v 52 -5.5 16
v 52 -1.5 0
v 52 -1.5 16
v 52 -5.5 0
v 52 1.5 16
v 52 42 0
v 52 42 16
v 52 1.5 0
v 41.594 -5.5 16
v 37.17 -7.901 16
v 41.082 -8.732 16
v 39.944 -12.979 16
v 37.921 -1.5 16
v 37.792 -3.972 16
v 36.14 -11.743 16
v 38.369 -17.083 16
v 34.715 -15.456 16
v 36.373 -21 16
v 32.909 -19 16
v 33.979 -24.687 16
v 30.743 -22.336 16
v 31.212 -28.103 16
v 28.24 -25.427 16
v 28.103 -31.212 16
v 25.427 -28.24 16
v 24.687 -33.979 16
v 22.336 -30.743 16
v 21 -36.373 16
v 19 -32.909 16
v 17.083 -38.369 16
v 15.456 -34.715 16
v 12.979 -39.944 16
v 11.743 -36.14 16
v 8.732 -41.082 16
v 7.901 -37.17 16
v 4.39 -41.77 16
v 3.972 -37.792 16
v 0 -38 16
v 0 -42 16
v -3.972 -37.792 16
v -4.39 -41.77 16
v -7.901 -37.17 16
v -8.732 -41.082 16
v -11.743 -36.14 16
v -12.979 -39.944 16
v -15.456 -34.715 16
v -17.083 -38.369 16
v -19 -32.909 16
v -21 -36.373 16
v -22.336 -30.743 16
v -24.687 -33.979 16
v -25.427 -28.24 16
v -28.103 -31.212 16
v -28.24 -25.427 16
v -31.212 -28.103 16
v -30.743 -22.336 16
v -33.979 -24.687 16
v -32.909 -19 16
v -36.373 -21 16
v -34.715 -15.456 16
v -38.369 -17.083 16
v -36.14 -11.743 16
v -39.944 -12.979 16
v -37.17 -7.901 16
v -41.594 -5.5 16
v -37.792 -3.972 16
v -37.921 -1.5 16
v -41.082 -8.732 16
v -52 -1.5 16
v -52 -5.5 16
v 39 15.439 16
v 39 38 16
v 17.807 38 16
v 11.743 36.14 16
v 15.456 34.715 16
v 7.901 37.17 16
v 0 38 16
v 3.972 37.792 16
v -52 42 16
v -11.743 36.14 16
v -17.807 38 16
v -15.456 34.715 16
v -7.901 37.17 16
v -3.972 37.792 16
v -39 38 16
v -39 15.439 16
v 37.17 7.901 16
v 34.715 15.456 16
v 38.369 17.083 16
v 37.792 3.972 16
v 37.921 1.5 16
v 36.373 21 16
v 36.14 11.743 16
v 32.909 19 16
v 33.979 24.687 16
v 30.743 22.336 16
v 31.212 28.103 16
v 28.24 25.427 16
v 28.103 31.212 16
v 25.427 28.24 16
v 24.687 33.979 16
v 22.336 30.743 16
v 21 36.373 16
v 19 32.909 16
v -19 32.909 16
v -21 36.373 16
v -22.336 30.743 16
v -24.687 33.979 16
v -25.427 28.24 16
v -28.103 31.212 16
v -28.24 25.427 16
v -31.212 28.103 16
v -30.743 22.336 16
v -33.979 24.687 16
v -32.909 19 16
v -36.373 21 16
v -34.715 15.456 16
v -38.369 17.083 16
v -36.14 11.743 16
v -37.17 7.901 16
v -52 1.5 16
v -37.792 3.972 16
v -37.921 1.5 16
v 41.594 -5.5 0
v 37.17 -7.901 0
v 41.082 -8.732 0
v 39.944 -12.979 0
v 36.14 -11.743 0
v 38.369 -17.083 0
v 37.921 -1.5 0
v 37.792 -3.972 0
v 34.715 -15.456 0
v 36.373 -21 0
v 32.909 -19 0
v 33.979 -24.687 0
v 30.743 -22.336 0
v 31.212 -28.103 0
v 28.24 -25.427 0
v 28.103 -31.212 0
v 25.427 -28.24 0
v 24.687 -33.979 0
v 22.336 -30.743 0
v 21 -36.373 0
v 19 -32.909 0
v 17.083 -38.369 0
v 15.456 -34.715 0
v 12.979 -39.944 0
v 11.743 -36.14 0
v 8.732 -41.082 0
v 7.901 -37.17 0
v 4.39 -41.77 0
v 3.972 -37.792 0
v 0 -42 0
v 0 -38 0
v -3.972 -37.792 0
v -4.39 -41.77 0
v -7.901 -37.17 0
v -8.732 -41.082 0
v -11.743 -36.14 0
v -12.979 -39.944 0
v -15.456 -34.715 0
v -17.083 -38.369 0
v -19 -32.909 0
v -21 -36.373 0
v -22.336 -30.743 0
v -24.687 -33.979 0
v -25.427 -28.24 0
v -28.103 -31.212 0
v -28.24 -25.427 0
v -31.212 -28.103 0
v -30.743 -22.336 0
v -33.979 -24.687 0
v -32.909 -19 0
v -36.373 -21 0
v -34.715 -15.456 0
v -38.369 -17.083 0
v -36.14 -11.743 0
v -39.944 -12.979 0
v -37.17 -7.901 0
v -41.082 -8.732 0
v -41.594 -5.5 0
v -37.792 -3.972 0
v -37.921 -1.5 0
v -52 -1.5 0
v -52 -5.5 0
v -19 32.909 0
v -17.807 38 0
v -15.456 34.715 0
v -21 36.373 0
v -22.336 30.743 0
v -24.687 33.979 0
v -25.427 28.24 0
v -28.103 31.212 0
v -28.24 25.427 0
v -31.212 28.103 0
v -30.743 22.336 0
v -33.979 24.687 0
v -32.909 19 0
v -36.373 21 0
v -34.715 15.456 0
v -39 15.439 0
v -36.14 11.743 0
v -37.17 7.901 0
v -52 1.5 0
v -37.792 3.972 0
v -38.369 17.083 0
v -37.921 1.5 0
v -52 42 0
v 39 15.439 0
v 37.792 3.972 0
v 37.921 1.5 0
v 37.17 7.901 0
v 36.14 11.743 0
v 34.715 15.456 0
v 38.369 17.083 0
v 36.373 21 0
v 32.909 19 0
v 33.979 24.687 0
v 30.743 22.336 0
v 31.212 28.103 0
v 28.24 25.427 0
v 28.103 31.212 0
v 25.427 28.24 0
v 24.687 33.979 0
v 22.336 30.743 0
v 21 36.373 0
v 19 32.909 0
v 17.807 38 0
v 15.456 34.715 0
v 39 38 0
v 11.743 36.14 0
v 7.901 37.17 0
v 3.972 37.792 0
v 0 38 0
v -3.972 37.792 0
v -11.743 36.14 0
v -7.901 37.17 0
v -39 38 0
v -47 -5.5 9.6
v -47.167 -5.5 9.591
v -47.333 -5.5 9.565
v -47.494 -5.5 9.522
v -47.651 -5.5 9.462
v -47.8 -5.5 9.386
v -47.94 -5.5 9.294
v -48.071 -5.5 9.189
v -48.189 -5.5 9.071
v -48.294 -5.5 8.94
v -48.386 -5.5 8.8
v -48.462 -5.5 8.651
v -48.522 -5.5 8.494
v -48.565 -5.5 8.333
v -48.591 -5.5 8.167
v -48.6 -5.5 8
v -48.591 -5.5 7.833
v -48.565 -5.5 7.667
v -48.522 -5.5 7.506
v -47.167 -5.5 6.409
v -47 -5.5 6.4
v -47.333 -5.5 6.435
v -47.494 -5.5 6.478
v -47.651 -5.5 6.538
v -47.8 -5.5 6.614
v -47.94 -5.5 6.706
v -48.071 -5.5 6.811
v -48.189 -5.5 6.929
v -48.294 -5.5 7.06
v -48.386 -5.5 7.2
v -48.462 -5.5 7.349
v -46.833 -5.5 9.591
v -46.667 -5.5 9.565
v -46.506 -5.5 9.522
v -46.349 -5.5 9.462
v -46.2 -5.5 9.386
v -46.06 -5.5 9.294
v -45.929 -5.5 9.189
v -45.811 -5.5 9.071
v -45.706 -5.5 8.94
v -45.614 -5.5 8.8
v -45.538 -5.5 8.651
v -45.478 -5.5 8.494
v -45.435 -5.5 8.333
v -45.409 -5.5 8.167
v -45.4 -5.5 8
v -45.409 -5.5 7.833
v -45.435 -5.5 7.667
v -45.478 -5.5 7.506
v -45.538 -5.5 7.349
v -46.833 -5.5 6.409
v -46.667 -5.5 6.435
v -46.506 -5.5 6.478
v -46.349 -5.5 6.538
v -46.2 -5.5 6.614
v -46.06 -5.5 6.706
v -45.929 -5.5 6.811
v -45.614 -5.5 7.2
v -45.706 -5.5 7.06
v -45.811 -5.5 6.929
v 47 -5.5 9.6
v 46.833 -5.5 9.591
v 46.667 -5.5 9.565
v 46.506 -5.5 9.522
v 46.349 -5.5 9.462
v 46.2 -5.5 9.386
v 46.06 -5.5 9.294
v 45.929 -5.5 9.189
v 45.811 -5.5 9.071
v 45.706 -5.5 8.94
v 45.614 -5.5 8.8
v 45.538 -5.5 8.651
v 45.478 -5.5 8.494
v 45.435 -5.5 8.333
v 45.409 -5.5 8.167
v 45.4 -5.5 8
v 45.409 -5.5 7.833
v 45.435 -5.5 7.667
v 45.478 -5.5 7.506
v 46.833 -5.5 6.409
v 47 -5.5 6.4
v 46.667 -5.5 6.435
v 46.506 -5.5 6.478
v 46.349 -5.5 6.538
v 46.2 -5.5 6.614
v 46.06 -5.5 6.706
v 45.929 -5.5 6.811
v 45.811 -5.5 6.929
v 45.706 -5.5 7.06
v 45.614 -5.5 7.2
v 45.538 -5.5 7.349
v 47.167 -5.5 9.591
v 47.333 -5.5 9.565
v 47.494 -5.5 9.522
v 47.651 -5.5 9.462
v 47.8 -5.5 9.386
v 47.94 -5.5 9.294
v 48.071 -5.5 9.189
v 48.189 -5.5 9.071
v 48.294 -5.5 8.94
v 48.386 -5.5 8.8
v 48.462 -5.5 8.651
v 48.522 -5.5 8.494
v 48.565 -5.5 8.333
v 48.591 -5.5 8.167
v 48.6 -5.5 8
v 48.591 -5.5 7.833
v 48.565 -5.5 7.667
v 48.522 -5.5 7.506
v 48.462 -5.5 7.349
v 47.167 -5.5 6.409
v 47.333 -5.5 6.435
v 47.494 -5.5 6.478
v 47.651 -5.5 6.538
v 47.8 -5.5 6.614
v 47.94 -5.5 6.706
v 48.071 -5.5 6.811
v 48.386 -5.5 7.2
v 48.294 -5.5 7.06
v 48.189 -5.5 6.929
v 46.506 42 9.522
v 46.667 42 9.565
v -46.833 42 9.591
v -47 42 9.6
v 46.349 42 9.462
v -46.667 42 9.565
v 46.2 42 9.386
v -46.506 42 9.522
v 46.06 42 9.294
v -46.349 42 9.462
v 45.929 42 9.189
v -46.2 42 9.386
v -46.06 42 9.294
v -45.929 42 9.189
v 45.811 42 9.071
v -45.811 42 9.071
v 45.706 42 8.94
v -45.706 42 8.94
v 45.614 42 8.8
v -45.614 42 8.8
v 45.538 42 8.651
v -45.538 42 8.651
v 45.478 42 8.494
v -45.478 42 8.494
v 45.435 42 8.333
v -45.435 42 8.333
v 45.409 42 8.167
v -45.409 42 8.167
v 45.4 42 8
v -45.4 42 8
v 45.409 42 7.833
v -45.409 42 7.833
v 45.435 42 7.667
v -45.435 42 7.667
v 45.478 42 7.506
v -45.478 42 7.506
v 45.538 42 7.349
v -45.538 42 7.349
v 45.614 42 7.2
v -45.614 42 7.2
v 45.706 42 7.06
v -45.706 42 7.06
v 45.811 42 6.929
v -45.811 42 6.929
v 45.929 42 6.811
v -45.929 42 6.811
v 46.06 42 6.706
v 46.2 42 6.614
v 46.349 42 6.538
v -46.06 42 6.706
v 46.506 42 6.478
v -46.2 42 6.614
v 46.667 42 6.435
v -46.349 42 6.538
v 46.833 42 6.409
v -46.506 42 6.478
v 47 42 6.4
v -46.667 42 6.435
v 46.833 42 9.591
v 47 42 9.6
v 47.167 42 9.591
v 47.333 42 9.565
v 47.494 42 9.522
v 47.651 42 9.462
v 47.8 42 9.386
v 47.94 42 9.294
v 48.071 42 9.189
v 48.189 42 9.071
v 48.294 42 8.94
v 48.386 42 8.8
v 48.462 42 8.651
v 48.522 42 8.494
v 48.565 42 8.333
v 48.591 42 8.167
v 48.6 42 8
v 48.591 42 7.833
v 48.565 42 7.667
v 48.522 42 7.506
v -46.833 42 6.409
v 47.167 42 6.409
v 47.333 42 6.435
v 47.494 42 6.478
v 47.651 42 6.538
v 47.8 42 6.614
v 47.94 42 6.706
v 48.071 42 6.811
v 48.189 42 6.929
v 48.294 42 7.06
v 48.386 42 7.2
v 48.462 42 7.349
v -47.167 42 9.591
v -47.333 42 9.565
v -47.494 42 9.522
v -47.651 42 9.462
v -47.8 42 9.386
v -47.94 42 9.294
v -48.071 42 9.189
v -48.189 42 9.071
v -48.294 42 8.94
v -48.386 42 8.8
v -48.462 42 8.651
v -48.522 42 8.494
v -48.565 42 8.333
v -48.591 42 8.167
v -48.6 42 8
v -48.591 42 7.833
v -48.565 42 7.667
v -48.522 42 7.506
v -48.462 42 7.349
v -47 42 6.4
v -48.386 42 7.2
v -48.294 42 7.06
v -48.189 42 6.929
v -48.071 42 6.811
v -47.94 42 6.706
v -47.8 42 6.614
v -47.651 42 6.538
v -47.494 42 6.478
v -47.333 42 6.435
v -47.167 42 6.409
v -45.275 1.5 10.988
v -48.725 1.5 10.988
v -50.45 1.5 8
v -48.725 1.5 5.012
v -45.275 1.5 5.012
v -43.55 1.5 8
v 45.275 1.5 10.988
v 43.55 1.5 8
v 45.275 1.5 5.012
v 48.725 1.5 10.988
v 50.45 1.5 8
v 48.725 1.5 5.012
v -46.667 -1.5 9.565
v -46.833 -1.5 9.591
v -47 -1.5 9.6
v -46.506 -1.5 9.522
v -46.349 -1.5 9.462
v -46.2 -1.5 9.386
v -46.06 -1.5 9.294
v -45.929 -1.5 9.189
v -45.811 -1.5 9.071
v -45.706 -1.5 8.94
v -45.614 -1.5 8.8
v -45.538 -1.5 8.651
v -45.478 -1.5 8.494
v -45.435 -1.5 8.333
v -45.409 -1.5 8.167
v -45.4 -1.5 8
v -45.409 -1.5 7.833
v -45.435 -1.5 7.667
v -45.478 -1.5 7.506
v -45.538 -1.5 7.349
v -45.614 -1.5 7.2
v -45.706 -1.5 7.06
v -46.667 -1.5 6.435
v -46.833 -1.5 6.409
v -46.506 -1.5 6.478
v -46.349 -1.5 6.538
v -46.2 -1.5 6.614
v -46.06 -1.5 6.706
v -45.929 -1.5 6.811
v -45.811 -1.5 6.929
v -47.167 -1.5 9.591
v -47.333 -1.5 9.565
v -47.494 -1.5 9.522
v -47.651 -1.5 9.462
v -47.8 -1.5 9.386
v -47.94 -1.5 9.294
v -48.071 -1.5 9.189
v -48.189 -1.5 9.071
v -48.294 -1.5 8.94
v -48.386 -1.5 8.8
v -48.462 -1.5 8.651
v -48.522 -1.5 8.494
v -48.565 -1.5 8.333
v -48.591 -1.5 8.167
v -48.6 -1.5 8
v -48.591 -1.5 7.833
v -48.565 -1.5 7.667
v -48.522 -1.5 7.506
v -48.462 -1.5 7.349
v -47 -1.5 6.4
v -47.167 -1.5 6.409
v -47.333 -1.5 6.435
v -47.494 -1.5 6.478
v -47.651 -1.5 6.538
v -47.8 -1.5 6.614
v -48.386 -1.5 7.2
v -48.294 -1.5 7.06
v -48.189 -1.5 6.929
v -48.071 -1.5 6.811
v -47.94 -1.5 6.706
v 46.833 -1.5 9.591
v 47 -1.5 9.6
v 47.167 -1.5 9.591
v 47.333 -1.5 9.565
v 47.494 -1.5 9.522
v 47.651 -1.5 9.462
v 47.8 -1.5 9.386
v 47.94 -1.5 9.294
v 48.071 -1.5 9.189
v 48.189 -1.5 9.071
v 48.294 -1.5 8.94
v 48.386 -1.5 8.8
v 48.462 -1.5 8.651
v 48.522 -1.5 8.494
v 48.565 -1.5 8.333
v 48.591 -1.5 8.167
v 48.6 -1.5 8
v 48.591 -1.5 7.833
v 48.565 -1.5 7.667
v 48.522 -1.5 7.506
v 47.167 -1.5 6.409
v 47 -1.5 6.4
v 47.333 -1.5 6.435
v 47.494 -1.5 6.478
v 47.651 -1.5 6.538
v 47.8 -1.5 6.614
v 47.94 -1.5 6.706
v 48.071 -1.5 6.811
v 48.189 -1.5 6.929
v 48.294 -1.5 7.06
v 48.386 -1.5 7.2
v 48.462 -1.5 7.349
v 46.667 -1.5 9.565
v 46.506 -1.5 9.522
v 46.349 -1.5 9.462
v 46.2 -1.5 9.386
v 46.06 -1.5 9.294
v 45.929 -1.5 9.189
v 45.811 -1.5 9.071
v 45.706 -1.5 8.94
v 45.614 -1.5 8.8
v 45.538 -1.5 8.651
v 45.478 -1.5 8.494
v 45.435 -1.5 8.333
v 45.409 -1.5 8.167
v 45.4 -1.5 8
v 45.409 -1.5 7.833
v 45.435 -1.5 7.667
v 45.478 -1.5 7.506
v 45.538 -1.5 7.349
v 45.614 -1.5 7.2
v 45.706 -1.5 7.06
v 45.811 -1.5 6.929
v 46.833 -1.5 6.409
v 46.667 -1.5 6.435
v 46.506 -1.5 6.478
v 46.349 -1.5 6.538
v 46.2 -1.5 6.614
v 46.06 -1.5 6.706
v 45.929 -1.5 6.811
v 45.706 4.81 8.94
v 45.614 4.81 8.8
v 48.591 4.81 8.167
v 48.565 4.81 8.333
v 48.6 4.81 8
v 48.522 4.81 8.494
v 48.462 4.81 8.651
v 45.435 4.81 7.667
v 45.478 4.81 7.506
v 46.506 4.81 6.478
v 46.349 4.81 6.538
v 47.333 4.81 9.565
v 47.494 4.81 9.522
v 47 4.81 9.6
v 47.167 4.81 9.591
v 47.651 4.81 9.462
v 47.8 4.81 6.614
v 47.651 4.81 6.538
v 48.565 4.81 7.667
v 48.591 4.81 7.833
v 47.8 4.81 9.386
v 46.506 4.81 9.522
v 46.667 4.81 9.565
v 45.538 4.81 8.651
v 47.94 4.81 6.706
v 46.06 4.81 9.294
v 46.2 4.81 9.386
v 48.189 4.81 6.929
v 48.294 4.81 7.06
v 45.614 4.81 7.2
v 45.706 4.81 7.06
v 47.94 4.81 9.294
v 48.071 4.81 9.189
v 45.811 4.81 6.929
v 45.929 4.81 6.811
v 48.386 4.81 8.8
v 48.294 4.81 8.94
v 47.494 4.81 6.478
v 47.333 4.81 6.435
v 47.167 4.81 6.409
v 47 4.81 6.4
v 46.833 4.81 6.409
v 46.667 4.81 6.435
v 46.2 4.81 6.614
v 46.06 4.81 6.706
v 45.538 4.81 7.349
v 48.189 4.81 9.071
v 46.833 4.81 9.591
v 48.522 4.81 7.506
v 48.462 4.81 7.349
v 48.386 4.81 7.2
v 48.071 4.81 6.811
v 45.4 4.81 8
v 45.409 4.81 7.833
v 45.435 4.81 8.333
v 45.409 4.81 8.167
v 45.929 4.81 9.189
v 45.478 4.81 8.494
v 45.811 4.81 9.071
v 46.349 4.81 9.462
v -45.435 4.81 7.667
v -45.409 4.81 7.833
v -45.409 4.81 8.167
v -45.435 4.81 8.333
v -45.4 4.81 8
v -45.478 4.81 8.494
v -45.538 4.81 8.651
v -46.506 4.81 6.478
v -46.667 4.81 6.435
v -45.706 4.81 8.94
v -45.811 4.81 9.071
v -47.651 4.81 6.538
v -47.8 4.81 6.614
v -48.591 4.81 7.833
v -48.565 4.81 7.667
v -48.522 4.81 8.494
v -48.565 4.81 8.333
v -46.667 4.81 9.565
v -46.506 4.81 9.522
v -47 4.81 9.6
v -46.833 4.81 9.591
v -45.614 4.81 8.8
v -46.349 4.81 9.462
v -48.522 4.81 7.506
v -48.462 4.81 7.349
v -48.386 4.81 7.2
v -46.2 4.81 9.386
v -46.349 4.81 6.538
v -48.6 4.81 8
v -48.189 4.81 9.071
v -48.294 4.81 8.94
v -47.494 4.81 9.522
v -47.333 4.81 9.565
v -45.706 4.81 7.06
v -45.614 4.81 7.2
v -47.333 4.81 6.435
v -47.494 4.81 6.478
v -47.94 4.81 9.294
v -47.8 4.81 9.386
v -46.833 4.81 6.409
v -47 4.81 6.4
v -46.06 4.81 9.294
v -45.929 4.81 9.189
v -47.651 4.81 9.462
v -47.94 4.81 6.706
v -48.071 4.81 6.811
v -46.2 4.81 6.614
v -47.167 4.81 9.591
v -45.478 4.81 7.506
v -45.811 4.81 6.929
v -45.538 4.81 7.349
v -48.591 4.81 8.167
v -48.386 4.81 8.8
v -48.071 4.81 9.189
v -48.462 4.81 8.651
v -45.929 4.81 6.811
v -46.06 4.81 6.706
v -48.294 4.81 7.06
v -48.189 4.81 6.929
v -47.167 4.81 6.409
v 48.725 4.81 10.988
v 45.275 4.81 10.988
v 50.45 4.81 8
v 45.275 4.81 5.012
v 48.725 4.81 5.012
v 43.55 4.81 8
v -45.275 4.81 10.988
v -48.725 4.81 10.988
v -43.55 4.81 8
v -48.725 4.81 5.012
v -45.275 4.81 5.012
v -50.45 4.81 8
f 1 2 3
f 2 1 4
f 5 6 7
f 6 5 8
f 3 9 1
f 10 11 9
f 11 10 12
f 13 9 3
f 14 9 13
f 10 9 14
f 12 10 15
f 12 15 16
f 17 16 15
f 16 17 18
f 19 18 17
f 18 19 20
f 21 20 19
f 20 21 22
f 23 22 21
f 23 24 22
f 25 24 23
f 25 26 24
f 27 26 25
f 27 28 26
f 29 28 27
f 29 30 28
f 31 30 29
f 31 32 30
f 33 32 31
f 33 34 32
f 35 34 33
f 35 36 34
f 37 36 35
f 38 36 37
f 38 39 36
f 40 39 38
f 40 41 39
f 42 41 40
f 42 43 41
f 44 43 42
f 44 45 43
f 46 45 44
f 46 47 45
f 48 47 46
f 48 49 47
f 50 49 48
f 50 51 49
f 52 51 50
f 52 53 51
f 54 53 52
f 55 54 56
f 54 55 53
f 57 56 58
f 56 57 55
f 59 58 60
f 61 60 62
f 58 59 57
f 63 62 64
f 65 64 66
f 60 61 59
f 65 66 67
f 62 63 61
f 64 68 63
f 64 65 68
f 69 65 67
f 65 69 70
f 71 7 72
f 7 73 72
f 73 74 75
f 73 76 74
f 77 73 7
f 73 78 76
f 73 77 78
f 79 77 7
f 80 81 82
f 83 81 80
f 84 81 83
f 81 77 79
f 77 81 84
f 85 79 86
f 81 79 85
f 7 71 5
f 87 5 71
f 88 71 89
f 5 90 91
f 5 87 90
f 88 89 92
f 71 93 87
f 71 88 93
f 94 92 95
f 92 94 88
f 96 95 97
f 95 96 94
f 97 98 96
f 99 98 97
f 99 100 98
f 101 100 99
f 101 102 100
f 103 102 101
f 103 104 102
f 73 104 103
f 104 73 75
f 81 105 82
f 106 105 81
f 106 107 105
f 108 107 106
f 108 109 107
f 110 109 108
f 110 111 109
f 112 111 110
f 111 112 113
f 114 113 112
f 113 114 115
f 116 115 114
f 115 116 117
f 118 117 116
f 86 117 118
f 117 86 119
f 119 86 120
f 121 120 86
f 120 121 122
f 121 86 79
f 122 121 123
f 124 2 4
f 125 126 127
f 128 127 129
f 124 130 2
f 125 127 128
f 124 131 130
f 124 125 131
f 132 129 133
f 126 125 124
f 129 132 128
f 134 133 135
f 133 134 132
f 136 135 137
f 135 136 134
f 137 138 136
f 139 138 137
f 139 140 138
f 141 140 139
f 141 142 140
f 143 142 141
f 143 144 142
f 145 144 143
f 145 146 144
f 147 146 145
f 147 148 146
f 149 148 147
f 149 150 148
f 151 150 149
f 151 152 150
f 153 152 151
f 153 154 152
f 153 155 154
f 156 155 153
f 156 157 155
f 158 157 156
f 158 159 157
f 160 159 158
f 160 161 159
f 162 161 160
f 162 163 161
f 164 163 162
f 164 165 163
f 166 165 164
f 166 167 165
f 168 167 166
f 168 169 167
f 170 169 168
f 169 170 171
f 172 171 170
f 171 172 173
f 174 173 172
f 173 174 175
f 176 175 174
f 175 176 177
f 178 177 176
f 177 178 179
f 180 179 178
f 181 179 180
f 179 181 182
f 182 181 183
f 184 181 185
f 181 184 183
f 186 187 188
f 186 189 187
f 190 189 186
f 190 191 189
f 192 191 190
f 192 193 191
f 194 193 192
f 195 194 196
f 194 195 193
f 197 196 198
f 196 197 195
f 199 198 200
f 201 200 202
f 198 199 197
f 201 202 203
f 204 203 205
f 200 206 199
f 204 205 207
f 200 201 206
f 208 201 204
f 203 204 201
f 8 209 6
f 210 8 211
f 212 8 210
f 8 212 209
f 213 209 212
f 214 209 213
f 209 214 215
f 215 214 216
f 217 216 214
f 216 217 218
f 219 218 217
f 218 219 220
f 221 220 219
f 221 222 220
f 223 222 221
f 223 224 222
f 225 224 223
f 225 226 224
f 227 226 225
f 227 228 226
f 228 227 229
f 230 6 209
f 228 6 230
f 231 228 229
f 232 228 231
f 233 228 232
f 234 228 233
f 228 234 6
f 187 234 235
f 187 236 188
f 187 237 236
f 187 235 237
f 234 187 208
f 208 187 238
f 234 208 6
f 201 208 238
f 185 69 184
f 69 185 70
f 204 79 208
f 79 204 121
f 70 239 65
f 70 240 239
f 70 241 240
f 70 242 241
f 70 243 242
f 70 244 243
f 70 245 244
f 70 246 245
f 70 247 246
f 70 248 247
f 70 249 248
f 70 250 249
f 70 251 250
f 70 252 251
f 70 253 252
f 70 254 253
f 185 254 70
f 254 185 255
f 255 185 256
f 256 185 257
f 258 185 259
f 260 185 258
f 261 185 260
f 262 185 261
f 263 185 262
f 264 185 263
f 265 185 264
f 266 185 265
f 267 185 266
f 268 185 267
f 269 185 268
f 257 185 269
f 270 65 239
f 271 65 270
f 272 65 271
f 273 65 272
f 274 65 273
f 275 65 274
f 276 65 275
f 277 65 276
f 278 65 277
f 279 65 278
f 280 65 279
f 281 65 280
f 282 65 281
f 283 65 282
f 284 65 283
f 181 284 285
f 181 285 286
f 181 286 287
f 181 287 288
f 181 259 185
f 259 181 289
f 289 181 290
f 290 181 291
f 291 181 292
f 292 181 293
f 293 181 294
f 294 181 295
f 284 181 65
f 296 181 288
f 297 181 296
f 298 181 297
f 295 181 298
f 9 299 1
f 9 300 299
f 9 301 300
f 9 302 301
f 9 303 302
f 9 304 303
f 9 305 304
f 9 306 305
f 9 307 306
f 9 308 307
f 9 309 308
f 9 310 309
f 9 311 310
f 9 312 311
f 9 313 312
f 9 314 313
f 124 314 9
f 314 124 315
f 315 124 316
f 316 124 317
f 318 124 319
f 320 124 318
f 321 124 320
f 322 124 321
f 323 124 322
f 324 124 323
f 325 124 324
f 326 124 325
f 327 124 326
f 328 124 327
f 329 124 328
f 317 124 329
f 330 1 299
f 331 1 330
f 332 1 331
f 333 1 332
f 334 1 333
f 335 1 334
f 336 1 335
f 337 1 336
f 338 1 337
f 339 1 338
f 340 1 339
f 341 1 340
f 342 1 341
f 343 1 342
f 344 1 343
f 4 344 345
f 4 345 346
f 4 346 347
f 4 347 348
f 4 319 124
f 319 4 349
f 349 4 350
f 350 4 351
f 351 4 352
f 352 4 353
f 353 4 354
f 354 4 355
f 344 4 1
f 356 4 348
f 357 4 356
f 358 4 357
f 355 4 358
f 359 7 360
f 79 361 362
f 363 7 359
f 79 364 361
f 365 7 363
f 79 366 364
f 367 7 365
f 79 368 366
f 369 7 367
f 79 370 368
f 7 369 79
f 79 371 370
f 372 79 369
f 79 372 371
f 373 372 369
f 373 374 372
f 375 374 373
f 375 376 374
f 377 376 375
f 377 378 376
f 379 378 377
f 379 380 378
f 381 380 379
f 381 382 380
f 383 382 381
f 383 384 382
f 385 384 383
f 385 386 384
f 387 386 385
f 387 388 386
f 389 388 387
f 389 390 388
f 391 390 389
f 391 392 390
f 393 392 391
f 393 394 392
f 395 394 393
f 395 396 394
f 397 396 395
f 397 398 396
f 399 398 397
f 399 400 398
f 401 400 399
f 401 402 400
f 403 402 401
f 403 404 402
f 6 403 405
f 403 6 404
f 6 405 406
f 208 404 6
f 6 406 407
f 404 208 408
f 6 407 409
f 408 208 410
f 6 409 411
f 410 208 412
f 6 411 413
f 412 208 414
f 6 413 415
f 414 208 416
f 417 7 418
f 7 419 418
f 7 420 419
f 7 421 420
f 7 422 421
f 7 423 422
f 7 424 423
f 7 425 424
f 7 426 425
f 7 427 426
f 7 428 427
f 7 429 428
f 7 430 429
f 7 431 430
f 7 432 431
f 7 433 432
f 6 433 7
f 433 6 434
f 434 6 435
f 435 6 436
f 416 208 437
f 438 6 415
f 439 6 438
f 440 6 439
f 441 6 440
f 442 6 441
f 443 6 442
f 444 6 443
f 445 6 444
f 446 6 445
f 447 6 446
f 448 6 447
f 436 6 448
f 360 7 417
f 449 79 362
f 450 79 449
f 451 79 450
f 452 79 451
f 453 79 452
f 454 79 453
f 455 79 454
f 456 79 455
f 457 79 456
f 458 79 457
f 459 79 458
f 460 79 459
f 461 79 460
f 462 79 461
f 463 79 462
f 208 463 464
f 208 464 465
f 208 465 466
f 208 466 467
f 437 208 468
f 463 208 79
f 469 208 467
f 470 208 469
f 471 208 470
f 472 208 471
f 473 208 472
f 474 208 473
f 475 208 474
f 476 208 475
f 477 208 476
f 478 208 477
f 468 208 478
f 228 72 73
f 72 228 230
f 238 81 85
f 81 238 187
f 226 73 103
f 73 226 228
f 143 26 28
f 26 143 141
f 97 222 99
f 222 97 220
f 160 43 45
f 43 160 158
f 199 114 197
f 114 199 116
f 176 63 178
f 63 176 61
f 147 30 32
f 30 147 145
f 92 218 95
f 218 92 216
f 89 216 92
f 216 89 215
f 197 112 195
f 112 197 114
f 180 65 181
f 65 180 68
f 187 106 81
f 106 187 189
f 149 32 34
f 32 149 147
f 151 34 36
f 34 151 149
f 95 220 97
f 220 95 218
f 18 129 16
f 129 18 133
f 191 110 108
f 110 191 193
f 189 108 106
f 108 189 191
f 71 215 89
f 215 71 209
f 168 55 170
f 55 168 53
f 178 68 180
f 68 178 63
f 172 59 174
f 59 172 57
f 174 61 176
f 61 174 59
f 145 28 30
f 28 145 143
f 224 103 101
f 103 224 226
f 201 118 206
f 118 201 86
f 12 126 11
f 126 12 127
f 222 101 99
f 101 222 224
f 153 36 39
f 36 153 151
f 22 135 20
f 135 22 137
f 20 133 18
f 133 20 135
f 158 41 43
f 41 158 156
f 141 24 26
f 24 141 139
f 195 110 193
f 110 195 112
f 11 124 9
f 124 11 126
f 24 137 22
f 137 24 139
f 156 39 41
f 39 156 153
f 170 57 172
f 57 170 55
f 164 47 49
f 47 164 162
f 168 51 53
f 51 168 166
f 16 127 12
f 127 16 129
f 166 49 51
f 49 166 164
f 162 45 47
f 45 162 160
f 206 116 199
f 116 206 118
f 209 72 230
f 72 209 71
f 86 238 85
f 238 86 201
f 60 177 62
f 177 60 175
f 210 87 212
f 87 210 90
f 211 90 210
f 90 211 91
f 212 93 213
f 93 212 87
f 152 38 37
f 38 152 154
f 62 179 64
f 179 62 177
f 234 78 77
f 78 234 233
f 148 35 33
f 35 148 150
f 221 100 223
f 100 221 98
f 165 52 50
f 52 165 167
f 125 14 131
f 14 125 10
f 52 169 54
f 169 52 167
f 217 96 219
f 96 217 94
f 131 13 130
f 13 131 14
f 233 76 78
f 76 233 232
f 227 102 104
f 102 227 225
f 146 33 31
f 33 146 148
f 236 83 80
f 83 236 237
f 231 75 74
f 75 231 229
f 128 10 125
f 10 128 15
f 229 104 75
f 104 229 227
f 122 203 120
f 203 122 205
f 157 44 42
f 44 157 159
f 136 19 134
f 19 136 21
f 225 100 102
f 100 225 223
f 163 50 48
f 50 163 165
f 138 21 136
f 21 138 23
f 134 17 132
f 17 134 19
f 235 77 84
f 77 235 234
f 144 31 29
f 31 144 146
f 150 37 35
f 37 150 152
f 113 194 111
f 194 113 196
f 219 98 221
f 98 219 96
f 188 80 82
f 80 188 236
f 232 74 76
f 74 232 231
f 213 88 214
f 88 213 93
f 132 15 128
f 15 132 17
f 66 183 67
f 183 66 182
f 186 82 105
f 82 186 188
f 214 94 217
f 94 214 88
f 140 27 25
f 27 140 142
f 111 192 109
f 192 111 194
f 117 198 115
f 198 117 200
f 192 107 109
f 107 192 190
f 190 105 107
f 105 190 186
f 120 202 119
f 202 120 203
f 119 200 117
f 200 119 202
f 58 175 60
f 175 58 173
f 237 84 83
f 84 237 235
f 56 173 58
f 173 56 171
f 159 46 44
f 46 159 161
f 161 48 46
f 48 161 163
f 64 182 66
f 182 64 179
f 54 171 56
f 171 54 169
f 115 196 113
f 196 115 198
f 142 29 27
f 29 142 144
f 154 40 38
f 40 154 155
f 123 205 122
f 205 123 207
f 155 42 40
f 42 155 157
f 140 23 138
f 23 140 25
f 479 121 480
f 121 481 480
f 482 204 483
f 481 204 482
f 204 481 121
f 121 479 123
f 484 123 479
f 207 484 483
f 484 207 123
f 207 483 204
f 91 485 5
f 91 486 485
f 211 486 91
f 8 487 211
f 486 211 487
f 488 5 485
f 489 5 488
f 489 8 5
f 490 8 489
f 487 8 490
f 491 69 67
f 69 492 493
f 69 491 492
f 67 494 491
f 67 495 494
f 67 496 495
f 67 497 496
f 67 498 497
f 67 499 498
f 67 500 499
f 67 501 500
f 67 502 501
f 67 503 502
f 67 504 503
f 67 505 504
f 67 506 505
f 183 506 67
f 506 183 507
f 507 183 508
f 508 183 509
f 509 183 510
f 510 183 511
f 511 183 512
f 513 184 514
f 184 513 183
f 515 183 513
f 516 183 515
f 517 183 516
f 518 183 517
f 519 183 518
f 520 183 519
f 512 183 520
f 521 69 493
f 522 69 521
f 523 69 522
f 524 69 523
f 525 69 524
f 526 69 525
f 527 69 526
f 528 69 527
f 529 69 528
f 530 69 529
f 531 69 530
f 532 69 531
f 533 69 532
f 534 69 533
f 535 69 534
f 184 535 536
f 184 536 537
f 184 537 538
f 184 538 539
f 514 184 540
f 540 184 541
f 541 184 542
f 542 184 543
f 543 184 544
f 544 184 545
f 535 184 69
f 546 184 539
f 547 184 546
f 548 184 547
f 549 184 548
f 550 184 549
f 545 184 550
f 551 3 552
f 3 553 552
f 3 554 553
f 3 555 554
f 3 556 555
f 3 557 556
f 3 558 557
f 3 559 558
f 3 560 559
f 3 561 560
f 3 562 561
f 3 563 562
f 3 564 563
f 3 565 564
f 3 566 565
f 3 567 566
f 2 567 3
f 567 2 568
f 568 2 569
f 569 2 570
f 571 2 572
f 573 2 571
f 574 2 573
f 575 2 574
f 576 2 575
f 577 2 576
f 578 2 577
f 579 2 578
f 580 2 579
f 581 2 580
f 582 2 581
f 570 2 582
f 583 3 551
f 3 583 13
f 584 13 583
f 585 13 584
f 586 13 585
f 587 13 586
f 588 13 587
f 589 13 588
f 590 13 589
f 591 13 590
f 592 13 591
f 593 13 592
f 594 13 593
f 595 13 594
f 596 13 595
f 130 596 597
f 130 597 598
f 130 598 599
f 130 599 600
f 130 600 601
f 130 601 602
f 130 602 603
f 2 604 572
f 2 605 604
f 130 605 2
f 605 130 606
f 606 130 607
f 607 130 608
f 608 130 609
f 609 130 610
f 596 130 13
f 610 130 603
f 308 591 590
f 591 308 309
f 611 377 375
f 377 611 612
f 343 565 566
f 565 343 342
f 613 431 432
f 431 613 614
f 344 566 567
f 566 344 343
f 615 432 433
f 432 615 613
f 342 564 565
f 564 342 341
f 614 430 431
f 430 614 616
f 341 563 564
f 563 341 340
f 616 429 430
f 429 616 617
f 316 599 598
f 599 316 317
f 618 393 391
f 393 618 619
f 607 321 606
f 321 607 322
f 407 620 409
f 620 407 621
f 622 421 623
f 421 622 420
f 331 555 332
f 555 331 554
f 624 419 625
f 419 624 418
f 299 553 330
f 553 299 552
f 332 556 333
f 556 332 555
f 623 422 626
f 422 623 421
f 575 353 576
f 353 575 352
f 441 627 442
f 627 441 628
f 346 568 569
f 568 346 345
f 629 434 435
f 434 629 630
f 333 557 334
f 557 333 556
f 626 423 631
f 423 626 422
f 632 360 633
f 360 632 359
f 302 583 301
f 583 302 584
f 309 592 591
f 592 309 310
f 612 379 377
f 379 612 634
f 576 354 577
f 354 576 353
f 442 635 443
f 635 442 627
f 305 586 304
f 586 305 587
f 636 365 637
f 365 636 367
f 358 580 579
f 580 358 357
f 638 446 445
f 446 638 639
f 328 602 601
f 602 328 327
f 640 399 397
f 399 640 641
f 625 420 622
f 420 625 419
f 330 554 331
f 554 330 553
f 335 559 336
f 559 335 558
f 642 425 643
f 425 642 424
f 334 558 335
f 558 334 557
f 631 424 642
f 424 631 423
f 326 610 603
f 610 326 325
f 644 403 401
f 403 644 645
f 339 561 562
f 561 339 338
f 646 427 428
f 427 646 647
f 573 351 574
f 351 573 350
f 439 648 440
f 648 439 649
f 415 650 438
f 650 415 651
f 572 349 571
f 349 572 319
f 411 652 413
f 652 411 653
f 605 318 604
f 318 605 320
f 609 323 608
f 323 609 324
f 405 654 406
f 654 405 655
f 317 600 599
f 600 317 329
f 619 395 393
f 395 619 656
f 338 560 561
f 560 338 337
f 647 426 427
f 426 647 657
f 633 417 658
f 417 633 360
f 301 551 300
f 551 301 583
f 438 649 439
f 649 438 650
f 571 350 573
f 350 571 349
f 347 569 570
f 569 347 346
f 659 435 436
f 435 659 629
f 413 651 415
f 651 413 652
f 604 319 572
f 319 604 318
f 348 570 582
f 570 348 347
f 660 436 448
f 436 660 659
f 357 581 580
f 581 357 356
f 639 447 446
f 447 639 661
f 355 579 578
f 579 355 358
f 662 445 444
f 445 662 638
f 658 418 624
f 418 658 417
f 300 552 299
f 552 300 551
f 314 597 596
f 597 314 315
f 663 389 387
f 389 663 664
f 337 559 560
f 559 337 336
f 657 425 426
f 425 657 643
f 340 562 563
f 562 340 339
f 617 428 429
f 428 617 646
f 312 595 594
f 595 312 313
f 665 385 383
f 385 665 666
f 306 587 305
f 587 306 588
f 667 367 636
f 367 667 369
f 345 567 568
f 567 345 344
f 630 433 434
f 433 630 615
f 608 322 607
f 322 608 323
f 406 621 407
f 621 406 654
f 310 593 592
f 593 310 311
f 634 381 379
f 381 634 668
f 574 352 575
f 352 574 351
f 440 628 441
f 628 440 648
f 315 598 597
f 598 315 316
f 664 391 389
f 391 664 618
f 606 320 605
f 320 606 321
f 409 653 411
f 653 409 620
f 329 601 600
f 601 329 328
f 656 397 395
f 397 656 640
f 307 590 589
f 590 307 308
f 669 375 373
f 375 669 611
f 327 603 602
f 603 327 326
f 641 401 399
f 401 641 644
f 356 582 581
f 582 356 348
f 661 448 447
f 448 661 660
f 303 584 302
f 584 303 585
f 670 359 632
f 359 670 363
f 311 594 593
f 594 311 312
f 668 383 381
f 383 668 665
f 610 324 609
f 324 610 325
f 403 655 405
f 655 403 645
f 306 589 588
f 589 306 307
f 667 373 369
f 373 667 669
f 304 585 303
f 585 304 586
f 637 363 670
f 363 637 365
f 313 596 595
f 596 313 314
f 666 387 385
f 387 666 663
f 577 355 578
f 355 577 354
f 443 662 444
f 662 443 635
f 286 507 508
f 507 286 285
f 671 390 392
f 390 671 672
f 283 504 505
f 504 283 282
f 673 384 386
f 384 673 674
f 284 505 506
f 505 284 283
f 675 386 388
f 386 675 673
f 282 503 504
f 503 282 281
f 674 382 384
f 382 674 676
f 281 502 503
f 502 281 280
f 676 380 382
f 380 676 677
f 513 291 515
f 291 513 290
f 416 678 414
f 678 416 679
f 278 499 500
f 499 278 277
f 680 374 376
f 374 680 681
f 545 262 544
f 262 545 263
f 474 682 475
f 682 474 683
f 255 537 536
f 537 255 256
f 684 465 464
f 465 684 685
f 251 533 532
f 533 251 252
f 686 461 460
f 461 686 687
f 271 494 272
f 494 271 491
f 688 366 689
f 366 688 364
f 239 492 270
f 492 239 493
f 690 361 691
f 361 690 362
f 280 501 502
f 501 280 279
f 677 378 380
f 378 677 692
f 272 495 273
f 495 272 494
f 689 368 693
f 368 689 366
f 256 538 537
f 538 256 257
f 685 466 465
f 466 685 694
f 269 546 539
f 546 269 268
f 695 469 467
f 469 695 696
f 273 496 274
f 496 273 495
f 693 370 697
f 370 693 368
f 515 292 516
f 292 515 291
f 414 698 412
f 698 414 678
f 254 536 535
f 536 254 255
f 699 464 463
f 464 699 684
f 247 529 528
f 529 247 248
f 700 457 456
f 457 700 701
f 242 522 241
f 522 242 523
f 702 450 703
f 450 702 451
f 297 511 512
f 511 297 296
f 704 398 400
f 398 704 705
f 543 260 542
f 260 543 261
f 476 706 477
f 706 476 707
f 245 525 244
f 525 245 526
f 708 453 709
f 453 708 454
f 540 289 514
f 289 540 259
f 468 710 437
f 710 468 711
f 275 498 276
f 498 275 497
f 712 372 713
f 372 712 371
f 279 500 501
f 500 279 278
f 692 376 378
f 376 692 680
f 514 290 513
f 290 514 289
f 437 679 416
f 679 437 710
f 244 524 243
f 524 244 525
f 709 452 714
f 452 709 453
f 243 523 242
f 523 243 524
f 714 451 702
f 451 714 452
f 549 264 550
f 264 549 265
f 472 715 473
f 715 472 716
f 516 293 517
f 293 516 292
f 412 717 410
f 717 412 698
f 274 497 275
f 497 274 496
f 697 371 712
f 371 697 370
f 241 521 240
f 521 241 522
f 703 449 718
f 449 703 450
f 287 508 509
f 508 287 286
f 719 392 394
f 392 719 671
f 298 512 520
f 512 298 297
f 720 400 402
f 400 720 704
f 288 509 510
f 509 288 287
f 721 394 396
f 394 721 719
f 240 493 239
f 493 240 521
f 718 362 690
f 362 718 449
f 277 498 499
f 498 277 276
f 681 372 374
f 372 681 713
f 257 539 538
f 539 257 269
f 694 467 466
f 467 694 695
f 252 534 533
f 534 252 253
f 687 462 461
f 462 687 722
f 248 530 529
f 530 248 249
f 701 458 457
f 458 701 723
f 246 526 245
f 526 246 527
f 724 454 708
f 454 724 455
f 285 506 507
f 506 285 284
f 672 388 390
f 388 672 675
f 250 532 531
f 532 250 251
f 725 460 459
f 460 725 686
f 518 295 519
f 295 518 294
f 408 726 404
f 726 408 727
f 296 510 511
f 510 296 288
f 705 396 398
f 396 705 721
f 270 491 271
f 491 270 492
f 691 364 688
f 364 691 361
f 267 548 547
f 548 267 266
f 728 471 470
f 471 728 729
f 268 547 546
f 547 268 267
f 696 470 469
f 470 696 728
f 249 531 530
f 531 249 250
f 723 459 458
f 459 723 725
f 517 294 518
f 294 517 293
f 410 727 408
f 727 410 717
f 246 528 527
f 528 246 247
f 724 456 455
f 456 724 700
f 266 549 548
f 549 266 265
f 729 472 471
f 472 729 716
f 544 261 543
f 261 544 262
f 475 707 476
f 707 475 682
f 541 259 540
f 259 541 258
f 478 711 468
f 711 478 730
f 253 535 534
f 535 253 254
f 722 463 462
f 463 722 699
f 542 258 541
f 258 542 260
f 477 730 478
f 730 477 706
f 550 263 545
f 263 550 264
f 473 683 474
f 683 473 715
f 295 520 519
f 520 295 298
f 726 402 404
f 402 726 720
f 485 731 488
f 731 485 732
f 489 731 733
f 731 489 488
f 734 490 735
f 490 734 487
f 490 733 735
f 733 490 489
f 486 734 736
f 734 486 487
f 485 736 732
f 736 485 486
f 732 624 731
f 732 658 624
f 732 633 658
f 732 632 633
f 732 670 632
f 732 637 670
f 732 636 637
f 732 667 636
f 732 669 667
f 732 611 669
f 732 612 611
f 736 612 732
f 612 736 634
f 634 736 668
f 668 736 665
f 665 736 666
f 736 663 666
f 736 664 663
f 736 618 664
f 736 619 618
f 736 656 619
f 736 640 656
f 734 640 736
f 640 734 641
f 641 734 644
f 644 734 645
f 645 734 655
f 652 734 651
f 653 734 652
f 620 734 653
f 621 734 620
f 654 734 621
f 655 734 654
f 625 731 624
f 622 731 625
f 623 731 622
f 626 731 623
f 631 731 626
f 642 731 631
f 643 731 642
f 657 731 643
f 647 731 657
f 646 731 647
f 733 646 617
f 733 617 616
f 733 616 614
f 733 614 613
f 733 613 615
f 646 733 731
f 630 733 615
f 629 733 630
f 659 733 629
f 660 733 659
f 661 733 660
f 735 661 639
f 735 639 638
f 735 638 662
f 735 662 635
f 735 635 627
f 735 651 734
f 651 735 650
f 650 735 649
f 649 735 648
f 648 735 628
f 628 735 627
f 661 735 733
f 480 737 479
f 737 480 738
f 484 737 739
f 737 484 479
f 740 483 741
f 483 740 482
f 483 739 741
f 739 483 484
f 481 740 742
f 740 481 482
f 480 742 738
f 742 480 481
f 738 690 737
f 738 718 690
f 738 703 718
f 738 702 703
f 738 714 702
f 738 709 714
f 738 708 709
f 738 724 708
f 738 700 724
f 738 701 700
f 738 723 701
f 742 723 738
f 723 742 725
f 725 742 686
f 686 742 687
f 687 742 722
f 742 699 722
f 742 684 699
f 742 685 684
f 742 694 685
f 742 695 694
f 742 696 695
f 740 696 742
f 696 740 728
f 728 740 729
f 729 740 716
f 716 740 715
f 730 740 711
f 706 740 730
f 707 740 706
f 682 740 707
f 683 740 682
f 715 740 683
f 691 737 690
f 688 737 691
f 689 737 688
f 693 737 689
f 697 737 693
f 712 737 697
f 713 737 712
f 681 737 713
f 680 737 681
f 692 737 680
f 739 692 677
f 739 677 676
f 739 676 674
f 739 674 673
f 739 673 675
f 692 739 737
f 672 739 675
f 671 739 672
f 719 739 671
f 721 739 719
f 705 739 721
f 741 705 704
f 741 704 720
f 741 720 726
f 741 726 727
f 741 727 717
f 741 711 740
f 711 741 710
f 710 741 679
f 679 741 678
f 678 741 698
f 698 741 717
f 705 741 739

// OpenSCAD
$fn=60;

polomer=38;
sirka_drzaku=16;
sila_drzaku=4;

prumer_sroubu=3.2;
vyska_matky=3;
sirka_matky=6.7;
presah_pro_drzak_sroubu=10;
mezera_mezi_dilci=3;

 translate([0,0,sirka_drzaku/2]) 
drzak_1();

module drzak_1(){


//ovál
difference () {
       
    union()   {  
        
    //drzak    
    cube([2*polomer+2*sila_drzaku+2*presah_pro_drzak_sroubu,2*sila_drzaku+mezera_mezi_dilci,sirka_drzaku],true);    
   
        
    //drzak u boxu    
    translate([0,polomer+sila_drzaku/2,0]) 
      cube([2*polomer+2*sila_drzaku+2*presah_pro_drzak_sroubu,sila_drzaku,sirka_drzaku],true);
    
    //kruh
    cylinder(h=sirka_drzaku, r=polomer+sila_drzaku, center=true);   
       
    //bocni vystuhy   
      translate([polomer+sila_drzaku+presah_pro_drzak_sroubu/2-3/2,polomer/2,0]) 
      cube([presah_pro_drzak_sroubu+3,polomer,sirka_drzaku],true);  
        
        
           translate([-polomer-sila_drzaku-presah_pro_drzak_sroubu/2+3/2,polomer/2,0]) 
      cube([presah_pro_drzak_sroubu+3,polomer,sirka_drzaku],true); 



        
} 
    cylinder(h=sirka_drzaku, r=polomer, center=true); 

    //mezera mezi dilci
cube([2*polomer+2*sila_drzaku+2*presah_pro_drzak_sroubu,mezera_mezi_dilci,sirka_drzaku],true);  


//otvor na sroub
rotate([90, 0, 0])
translate([polomer+sila_drzaku+presah_pro_drzak_sroubu/2,0,0]) 
cylinder(h=2*polomer+2*sila_drzaku+mezera_mezi_dilci, r=prumer_sroubu/2, center=true); 

rotate([90, 0, 0])
translate([-polomer-sila_drzaku-presah_pro_drzak_sroubu/2,0,0]) 
cylinder(h=2*polomer+2*sila_drzaku+mezera_mezi_dilci, r=prumer_sroubu/2, center=true); 


//otvor na matku
    translate([polomer+sila_drzaku+presah_pro_drzak_sroubu/2,mezera_mezi_dilci/2,0]) 
    rotate([-90, 0, 0])
    cylinder (h = vyska_matky+0.31, r= (sirka_matky+0.2)/2, $fn=6); 

translate([-polomer-sila_drzaku-presah_pro_drzak_sroubu/2,mezera_mezi_dilci/2,0]) 
    rotate([-90, 0, 0])
    cylinder (h = vyska_matky+0.31, r= (sirka_matky+0.2)/2, $fn=6); 



} 

 
   
    } 

      
  
 
